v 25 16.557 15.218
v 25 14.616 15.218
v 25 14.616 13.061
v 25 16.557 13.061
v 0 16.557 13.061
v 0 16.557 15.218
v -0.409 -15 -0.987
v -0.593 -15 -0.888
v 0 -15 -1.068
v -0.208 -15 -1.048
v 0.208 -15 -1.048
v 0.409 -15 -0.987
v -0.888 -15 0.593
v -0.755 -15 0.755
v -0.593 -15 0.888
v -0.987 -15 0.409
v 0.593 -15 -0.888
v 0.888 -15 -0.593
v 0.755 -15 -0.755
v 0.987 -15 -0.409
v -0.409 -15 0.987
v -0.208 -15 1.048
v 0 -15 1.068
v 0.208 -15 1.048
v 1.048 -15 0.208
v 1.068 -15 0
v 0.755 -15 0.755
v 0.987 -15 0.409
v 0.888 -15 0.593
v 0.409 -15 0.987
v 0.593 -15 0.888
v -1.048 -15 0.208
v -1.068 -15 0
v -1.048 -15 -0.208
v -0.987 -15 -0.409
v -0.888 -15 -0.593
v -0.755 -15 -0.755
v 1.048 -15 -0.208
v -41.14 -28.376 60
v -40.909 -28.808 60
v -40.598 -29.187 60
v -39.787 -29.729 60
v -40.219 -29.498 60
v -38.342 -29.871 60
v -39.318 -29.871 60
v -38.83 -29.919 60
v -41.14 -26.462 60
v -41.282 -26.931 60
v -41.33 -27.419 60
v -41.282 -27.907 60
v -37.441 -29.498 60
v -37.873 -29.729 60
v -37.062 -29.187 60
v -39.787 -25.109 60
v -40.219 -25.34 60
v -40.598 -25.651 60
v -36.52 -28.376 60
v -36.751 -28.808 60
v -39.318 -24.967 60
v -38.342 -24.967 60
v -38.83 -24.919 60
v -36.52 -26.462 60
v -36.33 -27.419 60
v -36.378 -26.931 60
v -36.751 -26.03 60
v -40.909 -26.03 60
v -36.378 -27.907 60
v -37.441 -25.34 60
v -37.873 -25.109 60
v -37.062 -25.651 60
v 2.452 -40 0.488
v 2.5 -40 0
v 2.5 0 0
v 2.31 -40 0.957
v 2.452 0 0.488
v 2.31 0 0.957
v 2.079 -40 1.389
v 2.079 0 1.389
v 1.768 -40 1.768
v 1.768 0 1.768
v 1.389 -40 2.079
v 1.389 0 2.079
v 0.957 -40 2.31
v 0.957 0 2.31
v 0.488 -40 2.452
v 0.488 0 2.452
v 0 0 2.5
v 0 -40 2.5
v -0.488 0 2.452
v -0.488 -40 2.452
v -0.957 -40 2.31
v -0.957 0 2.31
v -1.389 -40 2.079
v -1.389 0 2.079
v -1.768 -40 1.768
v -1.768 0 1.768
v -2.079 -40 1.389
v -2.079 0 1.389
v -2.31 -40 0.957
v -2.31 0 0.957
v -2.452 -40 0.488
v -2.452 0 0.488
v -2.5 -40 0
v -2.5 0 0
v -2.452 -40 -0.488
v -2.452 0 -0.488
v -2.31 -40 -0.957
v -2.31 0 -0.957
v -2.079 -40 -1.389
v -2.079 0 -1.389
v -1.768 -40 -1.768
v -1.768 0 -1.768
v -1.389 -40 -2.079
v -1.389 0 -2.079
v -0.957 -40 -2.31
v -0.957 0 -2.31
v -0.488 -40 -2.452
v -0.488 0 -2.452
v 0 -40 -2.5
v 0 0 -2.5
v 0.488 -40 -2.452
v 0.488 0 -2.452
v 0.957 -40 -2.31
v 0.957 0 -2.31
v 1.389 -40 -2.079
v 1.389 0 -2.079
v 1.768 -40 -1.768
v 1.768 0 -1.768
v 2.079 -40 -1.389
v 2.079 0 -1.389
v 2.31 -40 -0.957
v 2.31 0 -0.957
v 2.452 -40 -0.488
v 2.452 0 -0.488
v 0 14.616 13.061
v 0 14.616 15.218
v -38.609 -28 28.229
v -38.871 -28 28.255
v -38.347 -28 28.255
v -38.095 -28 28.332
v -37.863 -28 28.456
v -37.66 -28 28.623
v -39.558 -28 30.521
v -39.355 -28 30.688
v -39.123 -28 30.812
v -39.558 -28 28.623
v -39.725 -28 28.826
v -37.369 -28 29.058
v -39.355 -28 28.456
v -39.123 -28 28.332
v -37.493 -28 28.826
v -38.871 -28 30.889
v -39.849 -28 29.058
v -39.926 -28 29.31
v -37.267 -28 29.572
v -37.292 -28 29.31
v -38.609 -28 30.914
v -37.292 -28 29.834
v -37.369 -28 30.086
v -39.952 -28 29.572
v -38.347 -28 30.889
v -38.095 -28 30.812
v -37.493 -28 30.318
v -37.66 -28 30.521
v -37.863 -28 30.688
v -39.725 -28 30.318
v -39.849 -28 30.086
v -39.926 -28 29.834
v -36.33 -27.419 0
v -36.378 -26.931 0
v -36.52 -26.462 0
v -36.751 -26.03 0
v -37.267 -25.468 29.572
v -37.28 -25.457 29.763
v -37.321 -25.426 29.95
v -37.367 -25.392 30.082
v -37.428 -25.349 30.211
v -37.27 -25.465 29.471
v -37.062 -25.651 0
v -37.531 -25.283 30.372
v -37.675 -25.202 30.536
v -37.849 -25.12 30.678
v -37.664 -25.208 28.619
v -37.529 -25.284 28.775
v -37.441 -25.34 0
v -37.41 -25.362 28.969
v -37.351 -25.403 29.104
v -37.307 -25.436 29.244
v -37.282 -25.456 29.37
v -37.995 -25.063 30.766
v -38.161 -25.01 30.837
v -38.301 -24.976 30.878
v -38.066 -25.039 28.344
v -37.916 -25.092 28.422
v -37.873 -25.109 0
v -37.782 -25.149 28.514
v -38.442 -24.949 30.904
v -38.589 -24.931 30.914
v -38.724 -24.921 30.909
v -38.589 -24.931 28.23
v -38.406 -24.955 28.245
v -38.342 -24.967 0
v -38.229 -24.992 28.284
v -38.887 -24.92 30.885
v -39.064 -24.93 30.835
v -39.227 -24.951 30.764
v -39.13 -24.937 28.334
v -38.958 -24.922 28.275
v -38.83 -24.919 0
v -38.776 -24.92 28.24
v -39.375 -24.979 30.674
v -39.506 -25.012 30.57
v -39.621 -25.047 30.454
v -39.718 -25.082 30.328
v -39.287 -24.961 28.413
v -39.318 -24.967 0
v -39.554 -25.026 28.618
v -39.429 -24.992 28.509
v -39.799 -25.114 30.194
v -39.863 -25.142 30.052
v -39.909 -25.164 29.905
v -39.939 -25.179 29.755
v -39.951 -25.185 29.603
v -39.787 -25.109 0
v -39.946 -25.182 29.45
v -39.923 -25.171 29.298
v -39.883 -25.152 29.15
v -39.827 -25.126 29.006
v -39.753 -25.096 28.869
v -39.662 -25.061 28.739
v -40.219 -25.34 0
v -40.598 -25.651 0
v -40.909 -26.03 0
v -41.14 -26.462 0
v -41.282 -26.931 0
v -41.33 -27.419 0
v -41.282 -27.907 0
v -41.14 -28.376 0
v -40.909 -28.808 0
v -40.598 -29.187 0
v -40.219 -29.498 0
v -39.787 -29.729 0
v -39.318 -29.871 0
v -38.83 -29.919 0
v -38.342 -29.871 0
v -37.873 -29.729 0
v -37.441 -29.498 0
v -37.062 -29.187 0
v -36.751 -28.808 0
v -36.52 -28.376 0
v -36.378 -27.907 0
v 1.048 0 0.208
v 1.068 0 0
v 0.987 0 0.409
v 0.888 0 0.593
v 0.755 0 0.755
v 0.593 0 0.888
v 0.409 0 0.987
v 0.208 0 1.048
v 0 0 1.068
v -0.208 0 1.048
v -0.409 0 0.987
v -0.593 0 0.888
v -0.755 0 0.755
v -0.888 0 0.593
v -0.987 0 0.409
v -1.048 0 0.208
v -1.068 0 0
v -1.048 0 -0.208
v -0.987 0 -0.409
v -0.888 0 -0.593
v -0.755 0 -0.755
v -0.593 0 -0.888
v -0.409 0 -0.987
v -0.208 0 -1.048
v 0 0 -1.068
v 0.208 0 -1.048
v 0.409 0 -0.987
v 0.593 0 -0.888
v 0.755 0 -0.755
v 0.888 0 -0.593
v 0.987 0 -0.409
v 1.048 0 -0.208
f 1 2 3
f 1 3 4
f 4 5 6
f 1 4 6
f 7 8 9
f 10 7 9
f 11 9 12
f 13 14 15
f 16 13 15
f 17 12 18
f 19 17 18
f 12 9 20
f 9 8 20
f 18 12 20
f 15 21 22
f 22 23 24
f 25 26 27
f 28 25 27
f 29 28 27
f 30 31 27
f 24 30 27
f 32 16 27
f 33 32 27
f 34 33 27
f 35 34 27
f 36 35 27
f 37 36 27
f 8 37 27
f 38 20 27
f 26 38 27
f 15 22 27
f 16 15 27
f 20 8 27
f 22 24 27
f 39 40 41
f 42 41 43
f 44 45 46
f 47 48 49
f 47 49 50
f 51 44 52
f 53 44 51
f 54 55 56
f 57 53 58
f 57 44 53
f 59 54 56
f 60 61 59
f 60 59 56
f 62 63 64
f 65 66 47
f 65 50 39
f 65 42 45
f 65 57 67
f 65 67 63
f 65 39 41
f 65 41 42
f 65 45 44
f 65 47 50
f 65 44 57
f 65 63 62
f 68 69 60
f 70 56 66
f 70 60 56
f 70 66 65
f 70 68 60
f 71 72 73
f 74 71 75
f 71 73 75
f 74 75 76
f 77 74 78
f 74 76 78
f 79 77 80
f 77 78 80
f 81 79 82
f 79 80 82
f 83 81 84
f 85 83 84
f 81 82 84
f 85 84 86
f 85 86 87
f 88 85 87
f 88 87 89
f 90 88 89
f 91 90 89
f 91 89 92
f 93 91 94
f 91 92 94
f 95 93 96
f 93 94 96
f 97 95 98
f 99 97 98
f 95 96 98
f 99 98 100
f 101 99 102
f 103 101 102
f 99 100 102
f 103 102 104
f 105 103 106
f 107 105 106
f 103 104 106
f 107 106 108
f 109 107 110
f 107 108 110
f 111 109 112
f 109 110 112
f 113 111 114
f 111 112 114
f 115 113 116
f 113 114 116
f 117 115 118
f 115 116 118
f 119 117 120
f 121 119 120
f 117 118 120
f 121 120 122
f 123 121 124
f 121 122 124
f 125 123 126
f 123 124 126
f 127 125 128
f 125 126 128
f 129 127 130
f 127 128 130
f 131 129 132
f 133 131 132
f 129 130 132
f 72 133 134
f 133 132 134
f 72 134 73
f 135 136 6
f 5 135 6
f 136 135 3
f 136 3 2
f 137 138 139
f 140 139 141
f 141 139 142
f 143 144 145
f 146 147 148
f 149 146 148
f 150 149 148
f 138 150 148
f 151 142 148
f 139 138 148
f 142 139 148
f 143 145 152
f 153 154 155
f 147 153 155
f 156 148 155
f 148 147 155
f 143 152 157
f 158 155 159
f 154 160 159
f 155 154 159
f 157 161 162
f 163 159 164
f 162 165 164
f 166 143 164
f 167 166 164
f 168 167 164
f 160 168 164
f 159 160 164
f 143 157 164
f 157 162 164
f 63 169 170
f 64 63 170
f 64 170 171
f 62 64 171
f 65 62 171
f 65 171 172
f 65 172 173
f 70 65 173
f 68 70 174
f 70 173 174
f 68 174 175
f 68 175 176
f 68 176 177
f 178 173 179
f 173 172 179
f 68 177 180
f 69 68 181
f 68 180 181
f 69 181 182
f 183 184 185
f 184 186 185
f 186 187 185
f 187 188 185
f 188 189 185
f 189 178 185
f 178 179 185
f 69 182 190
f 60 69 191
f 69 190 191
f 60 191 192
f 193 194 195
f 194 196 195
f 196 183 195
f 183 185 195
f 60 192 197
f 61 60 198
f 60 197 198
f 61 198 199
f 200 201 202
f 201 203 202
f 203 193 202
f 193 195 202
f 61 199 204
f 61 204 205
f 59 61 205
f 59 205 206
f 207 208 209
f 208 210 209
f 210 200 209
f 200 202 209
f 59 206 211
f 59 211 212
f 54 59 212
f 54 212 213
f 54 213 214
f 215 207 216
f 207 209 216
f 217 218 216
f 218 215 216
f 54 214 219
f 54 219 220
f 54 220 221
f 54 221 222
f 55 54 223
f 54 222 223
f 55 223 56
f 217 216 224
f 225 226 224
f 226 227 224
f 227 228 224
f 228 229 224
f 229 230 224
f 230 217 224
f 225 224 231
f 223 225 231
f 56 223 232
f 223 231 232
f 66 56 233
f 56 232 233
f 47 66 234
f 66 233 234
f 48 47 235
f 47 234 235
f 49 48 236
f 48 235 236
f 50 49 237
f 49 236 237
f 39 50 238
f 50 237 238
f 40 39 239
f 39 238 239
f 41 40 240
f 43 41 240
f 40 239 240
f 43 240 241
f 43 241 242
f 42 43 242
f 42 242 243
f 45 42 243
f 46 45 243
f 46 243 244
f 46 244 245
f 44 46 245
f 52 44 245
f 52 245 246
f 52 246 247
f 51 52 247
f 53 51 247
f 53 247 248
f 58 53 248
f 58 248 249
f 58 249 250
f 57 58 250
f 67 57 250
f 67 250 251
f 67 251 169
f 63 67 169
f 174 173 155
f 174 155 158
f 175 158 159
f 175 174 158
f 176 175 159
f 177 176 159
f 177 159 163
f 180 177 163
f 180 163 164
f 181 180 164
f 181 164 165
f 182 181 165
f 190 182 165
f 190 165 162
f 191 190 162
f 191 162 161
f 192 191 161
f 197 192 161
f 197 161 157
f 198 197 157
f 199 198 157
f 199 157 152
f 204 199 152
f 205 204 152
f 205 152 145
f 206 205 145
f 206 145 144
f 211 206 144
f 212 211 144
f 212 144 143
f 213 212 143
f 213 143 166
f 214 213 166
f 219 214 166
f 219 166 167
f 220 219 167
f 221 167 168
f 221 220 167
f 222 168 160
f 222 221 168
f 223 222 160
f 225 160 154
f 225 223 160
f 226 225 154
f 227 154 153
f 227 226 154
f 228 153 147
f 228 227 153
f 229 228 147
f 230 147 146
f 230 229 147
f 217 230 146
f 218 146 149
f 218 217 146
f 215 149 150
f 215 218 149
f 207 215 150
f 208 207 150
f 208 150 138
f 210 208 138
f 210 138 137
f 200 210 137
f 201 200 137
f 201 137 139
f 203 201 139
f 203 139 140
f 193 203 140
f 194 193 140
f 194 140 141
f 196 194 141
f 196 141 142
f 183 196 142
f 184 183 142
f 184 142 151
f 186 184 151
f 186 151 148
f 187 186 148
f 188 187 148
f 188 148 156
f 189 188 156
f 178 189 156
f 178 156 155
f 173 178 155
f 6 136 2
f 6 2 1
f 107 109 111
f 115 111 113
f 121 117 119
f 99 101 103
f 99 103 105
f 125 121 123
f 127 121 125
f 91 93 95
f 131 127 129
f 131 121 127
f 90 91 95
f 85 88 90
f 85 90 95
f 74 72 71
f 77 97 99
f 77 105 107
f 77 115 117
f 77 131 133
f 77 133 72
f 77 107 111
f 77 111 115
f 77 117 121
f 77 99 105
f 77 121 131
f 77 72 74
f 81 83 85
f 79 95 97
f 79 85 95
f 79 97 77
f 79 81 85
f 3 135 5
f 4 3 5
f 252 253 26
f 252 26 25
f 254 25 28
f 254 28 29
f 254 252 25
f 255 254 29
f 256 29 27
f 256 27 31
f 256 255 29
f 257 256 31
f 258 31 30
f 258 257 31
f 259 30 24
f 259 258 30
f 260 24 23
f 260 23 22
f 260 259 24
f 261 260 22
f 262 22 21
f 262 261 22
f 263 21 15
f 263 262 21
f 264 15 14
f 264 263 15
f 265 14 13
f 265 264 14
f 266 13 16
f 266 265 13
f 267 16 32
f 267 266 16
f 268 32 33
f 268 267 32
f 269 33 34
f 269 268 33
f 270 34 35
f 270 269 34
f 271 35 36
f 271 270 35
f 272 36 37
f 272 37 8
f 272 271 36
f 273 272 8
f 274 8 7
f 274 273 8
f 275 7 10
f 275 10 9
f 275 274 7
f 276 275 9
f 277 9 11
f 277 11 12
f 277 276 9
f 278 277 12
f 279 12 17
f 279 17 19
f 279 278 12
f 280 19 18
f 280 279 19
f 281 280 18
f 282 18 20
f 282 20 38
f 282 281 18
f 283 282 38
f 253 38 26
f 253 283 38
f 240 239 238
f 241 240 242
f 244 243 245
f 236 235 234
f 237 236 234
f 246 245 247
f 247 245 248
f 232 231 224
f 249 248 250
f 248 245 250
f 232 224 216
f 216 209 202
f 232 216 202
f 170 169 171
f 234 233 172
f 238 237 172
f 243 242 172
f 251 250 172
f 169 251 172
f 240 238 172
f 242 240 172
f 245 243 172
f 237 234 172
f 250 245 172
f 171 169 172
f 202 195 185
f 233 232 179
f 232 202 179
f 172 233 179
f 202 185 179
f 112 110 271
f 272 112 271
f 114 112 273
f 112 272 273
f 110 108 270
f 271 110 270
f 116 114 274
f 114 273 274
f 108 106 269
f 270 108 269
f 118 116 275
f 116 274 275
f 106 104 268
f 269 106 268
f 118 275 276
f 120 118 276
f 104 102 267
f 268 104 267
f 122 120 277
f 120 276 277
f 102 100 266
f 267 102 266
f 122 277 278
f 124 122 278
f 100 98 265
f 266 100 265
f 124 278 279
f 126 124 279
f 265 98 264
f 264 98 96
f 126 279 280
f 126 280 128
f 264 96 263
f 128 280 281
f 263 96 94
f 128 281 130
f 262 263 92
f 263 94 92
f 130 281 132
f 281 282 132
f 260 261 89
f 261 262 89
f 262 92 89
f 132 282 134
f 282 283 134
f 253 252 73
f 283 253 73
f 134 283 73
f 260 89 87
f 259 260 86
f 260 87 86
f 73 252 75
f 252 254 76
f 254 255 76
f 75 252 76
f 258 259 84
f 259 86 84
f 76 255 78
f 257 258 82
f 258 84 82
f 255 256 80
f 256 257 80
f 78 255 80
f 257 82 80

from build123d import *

# Parameters (mm, degrees)
F0_R     = 2.5
F1_DEPTH = 40
F2_R     = 2.5
F3_DEPTH = 60
F4_R     = 1.068068
F5_DEPTH = 15
F6_R     = 1.342476
F7_DEPTH = 28
F8_W     = 1.941328
F8_H     = 2.15703
F9_DEPTH = 25


with BuildPart() as f1:
    # F0 (on Front) → F1 (new body)
    with BuildSketch(Plane.XZ):
        Circle(F0_R)
    extrude(amount=F1_DEPTH)

    # F4 (on Front) → F5 (cut)
    with BuildSketch(Plane.XZ):
        Circle(F4_R)
    extrude(amount=F5_DEPTH, mode=Mode.SUBTRACT)


with BuildPart() as f3:
    # F2 (on Top) → F3 (new body)
    with BuildSketch(Plane.XY):
        with Locations((-38.829888, -27.419055)):
            Circle(F2_R)
    extrude(amount=F3_DEPTH)

    # F6 (on Front) → F7 (cut)
    with BuildSketch(Plane.XZ):
        with Locations((-38.609069, 29.571837)):
            Circle(F6_R)
    extrude(amount=F7_DEPTH, mode=Mode.SUBTRACT)


with BuildPart() as f9:
    # F8 (on Right) → F9 (new body)
    with BuildSketch(Plane.YZ):
        with Locations((15.586394, 14.139386)):
            Rectangle(F8_W, F8_H)
    extrude(amount=F9_DEPTH)


solid = Compound([f1.part, f3.part, f9.part])
